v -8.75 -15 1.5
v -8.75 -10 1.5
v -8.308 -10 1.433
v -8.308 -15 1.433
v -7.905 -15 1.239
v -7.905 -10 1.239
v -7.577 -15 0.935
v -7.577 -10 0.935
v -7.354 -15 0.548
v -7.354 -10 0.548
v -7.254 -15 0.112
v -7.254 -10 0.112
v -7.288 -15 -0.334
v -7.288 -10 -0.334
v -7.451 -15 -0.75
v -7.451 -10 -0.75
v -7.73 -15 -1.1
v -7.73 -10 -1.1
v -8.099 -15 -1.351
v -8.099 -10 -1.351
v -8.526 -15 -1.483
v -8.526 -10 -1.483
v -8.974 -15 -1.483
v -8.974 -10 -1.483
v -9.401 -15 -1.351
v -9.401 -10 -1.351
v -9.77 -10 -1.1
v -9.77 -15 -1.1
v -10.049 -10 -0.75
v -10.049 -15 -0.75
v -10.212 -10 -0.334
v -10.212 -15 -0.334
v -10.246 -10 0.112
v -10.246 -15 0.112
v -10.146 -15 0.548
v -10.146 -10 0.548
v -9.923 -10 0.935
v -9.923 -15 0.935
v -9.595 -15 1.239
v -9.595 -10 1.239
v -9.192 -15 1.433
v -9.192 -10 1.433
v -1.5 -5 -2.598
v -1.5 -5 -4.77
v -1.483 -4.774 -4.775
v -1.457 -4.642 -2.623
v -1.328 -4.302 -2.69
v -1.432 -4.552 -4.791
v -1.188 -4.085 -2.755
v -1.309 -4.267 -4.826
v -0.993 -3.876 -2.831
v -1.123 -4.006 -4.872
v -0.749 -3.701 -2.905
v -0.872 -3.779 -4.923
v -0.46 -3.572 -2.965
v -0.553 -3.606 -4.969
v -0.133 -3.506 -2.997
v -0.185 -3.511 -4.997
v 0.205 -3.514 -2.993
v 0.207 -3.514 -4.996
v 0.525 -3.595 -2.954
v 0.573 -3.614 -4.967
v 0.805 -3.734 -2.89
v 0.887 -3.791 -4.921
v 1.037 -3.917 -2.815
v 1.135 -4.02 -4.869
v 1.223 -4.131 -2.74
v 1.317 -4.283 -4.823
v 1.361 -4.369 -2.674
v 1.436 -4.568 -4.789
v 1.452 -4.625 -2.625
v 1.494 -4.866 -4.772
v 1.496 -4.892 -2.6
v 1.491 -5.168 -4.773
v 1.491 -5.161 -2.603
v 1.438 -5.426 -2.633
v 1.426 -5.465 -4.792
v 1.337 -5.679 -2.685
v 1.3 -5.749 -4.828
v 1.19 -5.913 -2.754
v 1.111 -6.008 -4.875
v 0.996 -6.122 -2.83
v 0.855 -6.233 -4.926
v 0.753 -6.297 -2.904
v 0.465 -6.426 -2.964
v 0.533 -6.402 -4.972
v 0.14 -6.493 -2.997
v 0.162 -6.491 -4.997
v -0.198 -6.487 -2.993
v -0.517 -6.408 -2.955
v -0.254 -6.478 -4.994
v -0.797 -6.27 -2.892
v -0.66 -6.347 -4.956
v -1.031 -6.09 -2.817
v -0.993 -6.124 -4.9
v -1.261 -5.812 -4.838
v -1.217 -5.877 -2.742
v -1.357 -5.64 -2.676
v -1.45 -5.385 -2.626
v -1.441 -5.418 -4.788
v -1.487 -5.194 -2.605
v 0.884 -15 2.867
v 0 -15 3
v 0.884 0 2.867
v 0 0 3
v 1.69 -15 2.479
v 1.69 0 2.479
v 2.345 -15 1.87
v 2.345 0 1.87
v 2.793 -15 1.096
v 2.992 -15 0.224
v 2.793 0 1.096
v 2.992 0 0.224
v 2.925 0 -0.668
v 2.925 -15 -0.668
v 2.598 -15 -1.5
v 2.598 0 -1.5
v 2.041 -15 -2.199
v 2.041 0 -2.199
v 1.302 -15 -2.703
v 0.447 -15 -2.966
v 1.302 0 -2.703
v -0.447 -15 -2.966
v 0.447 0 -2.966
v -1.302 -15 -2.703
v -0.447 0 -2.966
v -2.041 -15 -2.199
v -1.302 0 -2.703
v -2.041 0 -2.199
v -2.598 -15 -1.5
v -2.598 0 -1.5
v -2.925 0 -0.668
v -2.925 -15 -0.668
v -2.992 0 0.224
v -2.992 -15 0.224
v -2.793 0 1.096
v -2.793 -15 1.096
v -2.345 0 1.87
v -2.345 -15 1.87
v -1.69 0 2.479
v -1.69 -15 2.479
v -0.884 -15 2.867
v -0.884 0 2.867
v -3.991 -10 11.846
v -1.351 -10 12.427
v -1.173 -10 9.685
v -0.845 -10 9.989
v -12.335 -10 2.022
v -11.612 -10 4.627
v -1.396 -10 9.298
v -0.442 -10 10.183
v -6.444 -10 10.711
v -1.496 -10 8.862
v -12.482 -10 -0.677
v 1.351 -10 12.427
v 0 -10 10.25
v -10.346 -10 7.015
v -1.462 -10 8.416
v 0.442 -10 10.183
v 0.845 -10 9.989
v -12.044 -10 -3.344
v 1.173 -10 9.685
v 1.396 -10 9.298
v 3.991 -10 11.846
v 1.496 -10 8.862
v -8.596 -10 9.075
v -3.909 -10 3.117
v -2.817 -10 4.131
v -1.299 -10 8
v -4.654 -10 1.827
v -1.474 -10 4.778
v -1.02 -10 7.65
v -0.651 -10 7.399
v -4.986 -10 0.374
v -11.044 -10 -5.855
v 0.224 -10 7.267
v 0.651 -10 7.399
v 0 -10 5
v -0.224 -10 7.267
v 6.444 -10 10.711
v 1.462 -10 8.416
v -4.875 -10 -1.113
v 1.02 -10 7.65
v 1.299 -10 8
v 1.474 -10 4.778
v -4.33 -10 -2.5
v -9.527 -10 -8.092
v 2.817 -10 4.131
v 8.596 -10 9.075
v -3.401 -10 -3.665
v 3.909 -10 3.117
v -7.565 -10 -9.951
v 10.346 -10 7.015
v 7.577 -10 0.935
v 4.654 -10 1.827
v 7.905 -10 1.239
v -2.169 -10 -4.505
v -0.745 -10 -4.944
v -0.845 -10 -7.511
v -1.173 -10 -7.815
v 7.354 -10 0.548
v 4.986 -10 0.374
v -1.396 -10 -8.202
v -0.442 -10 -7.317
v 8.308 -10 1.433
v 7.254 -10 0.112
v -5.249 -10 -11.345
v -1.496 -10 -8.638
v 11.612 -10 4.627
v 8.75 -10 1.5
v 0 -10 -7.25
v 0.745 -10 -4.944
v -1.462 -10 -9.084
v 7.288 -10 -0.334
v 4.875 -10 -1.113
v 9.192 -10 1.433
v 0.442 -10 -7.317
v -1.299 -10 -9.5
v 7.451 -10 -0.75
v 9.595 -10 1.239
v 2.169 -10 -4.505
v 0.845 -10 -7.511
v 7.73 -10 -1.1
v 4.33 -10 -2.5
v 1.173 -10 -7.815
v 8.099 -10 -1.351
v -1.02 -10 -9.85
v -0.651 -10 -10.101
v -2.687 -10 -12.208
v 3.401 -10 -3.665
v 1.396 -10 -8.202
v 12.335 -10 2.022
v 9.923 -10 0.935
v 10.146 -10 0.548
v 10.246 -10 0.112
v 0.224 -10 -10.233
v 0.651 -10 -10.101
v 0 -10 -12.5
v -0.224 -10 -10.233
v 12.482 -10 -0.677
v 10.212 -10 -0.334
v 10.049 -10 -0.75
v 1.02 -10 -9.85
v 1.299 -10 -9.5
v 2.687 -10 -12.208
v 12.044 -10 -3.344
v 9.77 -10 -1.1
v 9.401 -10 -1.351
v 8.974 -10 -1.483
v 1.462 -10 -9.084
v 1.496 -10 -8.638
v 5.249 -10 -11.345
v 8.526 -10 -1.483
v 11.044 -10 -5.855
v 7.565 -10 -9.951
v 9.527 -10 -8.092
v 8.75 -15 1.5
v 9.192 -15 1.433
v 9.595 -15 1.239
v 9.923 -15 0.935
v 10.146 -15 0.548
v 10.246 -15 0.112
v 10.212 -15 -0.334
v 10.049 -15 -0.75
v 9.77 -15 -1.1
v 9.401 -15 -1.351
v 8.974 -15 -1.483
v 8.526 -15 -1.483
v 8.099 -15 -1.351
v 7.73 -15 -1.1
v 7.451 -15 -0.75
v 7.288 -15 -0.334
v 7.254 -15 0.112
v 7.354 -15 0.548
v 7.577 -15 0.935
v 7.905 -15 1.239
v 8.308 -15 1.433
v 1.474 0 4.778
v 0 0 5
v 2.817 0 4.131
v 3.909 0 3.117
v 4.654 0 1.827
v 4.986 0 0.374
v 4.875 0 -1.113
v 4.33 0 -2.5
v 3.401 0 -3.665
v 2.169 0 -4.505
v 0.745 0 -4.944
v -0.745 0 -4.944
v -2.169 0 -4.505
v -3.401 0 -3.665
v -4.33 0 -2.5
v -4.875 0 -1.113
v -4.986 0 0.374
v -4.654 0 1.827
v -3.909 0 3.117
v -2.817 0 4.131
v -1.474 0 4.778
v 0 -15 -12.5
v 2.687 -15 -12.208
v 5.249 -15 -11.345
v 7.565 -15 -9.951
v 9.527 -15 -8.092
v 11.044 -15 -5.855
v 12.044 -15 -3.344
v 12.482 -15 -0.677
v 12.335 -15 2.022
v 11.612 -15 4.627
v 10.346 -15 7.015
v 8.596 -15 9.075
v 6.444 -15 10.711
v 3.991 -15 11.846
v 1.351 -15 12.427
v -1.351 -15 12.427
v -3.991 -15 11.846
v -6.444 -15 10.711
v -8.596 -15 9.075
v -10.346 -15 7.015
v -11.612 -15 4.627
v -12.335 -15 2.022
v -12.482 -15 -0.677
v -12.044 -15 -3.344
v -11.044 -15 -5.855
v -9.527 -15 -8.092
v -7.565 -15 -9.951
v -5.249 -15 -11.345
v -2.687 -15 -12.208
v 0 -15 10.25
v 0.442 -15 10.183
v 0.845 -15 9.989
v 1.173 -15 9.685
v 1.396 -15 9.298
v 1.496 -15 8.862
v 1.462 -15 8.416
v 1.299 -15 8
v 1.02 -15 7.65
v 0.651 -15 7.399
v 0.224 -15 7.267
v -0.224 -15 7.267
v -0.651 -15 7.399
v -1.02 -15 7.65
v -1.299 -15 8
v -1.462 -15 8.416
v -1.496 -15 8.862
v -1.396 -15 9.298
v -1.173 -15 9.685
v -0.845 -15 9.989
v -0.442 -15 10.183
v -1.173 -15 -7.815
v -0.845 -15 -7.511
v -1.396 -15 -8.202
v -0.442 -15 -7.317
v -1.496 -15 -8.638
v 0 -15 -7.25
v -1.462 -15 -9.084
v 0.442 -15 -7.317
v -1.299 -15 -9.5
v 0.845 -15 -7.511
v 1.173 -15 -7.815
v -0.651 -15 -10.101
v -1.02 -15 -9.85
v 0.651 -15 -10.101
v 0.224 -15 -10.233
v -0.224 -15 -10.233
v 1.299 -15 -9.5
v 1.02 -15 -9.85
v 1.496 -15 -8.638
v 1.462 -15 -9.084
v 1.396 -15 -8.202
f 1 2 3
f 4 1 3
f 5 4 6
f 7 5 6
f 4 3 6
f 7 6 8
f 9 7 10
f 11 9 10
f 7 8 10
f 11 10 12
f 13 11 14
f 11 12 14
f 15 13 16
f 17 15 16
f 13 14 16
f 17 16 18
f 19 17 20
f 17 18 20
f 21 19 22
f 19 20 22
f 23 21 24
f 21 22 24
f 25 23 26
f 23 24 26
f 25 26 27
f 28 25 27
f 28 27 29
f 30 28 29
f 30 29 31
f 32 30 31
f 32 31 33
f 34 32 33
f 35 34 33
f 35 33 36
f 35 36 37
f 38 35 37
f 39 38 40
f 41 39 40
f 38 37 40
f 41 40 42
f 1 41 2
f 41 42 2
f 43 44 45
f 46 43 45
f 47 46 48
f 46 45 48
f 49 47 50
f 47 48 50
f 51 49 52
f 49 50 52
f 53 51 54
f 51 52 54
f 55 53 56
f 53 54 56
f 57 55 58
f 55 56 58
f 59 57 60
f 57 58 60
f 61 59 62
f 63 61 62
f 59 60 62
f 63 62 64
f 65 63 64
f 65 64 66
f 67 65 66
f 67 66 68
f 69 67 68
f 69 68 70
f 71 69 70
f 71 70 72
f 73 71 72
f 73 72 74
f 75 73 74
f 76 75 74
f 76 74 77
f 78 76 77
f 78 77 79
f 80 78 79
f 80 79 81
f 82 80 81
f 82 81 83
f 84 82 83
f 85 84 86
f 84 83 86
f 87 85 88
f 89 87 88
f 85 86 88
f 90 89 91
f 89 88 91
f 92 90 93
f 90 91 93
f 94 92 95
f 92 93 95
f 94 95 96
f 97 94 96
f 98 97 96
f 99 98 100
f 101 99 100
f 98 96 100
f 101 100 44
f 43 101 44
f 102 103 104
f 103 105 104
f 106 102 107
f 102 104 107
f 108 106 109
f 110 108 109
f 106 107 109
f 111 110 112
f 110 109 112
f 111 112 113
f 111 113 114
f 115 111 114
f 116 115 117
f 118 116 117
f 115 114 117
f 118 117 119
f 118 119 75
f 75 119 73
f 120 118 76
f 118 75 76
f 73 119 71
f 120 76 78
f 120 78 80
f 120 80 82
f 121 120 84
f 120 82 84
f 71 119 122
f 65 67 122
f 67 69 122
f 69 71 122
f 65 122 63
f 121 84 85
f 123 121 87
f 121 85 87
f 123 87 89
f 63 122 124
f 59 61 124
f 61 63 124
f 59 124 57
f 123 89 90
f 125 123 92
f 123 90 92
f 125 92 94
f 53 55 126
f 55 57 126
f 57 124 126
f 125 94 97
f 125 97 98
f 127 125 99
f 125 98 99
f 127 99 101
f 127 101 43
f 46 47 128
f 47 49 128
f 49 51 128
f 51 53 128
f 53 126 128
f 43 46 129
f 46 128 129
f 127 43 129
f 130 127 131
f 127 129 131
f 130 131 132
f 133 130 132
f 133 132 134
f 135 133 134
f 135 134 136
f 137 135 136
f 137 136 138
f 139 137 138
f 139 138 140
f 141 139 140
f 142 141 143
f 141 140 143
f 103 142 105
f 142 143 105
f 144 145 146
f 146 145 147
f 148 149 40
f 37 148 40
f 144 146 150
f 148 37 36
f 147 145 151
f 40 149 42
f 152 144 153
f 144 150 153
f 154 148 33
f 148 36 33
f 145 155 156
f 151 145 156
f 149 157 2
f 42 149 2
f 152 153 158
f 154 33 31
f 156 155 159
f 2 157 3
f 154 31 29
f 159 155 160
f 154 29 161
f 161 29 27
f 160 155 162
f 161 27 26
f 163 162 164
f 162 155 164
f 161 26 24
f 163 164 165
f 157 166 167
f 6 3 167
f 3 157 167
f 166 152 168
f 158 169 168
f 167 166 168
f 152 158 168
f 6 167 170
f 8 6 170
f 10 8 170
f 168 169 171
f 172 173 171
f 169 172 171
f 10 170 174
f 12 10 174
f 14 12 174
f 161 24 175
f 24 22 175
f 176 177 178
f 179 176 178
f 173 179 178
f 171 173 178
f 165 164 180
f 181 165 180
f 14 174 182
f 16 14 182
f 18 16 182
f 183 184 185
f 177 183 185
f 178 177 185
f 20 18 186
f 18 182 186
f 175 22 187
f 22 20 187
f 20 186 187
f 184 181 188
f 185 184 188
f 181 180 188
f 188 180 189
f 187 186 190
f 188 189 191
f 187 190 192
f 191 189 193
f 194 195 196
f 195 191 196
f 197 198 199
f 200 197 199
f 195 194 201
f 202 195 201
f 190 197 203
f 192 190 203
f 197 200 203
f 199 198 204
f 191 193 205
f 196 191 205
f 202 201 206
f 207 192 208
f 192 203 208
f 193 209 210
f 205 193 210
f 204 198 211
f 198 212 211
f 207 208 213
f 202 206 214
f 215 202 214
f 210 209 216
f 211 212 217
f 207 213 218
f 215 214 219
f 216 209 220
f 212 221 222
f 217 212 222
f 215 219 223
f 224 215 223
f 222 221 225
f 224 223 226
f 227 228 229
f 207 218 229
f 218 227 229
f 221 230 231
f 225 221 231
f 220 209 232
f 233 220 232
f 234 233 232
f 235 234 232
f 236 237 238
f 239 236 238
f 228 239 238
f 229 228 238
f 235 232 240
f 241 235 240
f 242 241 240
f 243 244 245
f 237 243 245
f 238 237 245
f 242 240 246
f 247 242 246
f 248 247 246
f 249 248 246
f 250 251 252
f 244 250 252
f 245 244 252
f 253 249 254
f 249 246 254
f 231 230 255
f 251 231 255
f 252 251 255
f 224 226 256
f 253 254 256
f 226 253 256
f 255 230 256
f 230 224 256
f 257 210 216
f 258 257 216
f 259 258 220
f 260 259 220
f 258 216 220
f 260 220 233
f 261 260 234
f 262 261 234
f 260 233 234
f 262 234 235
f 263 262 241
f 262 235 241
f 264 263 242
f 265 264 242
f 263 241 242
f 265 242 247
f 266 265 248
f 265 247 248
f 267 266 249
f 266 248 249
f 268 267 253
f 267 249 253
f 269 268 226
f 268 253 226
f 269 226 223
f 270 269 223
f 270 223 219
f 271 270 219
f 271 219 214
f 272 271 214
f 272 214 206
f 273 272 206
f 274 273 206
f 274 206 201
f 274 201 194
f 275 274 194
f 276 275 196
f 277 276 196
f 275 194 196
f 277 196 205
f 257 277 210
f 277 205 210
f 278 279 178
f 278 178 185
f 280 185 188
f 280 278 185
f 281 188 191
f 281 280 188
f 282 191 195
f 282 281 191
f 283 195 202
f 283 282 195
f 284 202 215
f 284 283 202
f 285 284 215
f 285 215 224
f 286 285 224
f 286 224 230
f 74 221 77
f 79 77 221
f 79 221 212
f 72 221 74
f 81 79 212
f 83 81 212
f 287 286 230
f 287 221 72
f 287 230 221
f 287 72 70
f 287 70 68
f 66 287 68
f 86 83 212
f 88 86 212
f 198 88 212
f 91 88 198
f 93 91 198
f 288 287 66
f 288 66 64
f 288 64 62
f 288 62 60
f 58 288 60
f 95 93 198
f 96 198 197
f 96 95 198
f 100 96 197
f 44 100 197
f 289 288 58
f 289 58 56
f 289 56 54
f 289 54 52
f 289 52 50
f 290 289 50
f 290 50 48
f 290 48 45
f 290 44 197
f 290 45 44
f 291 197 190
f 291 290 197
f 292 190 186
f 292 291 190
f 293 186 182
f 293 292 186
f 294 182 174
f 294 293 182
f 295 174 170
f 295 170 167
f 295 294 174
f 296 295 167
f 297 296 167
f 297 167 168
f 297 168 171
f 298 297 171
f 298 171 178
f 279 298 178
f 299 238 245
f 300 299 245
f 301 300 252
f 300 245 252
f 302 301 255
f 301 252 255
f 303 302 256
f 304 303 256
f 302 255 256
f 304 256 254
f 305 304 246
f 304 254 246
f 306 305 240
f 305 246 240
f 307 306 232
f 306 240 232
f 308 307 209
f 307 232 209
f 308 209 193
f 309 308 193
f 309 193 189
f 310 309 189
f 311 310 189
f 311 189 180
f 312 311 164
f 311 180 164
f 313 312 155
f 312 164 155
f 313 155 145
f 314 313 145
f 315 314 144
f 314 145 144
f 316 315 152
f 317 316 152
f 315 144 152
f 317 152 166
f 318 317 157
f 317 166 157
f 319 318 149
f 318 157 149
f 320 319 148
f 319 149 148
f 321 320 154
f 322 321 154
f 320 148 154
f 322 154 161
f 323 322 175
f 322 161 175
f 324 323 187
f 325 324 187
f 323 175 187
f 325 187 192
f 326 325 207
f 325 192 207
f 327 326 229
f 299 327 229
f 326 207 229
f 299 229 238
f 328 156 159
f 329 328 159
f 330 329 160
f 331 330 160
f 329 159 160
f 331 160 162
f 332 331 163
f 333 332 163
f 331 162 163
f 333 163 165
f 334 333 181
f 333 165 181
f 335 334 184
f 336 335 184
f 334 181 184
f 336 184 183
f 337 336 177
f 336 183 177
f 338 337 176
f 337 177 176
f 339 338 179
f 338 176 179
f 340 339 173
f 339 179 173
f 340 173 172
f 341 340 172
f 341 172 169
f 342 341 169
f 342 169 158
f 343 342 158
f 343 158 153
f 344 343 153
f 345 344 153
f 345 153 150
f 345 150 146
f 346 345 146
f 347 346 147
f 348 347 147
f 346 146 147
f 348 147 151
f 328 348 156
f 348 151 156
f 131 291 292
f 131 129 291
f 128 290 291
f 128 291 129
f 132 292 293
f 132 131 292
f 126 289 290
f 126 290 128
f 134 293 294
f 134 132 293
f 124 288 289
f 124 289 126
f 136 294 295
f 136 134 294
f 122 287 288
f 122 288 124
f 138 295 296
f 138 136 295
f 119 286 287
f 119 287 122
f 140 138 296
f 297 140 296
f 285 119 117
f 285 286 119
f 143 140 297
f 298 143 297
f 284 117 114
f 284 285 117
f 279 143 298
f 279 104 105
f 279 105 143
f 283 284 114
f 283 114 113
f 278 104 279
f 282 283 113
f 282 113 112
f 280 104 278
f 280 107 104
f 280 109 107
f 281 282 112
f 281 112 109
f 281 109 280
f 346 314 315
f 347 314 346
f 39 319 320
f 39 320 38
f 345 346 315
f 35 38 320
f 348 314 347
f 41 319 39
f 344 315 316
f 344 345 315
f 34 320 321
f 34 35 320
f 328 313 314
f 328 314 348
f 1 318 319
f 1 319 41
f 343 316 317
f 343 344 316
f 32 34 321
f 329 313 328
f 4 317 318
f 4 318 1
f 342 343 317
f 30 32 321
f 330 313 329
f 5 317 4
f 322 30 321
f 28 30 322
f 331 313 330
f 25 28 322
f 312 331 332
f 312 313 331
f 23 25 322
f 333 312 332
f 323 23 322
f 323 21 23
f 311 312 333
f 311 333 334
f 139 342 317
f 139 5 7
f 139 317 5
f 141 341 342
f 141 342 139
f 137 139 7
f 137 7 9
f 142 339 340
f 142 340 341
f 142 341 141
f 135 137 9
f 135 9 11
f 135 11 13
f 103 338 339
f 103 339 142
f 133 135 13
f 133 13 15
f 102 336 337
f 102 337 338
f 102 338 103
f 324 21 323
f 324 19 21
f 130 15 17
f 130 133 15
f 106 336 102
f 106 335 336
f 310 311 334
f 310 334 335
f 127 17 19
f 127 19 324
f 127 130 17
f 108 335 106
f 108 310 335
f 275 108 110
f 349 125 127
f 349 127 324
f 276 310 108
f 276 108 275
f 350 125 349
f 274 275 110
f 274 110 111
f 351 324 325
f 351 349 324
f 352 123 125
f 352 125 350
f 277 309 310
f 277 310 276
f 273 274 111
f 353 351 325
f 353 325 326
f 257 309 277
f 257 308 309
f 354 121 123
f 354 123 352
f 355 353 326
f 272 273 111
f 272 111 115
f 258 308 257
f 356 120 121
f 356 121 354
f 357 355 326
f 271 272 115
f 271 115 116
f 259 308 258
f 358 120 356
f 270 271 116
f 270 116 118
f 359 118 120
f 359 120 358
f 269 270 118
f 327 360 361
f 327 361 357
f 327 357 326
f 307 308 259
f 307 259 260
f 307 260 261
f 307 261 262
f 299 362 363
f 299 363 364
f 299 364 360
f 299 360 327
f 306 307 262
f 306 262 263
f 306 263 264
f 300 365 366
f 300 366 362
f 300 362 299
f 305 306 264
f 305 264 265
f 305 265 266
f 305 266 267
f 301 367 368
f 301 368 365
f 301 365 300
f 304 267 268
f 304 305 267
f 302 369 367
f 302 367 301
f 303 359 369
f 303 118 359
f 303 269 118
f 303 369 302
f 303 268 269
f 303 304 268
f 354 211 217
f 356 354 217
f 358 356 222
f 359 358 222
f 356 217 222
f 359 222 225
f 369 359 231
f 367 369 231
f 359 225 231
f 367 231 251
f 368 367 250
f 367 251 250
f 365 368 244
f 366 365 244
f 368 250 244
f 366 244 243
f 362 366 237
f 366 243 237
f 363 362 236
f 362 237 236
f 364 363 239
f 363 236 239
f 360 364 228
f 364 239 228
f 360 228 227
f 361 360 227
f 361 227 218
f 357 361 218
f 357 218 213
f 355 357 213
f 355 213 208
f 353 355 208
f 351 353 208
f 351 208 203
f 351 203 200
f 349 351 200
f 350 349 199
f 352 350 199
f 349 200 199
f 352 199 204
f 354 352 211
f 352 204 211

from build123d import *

# Parameters (mm, degrees)
SKETCH1_R           = 5
SKETCH1_R_2         = 3
BOSS_EXTRUDE1_DEPTH = 10
SKETCH2_R           = 12.5
BOSS_EXTRUDE2_DEPTH = 5
SKETCH6_R           = 1.5
CUT_EXTRUDE1_DEPTH  = 5
SKETCH7_R           = 1.5
CUT_EXTRUDE2_DEPTH  = 5
SKETCH8_R           = 3
CUT_EXTRUDE3_DEPTH  = 5


with BuildPart() as part:
    # Sketch1 → Boss-Extrude1 (new body)
    with BuildSketch(Plane(origin=(0, 0, 0), x_dir=(1, 0, 0), z_dir=(0, 1, 0))):
        with Locations(Location((0, 0, 0), (0, 0, 270))):
            Circle(SKETCH1_R)
        with Locations(Location((0, 0, 0), (0, 0, 270))):
            Circle(SKETCH1_R_2, mode=Mode.SUBTRACT)
    extrude(amount=-BOSS_EXTRUDE1_DEPTH)

    # Sketch2 → Boss-Extrude2 (add)
    with BuildSketch(Plane.XZ.offset(10)):
        with Locations(Location((0, 0, 0), (0, 0, 270))):
            Circle(SKETCH2_R)
    extrude(amount=BOSS_EXTRUDE2_DEPTH)

    # Sketch6 → Cut-Extrude1 (cut)
    with BuildSketch(Plane(origin=(0, -10, 0), x_dir=(1, 0, 0), z_dir=(0, 1, 0))):
        with Locations(Location((0, 8.75, 0), (0, 0, 270))):
            Circle(SKETCH6_R)
        with Locations(Location((8.75, 0, 0), (0, 0, 270))):
            Circle(SKETCH6_R)
        with Locations(Location((0, -8.75, 0), (0, 0, 270))):
            Circle(SKETCH6_R)
        with Locations(Location((-8.75, 0, 0), (0, 0, 270))):
            Circle(SKETCH6_R)
    extrude(amount=-CUT_EXTRUDE1_DEPTH, mode=Mode.SUBTRACT)

    # Sketch7 → Cut-Extrude2 (cut)
    with BuildSketch(Plane(origin=(0, 0, -5), x_dir=(-1, 0, 0), z_dir=(0, 0, -1))):
        with Locations((0, -5)):
            Circle(SKETCH7_R)
    extrude(amount=-CUT_EXTRUDE2_DEPTH, mode=Mode.SUBTRACT)

    # Sketch8 → Cut-Extrude3 (cut)
    with BuildSketch(Plane(origin=(0, -10, 0), x_dir=(1, 0, 0), z_dir=(0, 1, 0))):
        with Locations(Location((0, 0, 0), (0, 0, 270))):
            Circle(SKETCH8_R)
    extrude(amount=-CUT_EXTRUDE3_DEPTH, mode=Mode.SUBTRACT)


solid = part.part
